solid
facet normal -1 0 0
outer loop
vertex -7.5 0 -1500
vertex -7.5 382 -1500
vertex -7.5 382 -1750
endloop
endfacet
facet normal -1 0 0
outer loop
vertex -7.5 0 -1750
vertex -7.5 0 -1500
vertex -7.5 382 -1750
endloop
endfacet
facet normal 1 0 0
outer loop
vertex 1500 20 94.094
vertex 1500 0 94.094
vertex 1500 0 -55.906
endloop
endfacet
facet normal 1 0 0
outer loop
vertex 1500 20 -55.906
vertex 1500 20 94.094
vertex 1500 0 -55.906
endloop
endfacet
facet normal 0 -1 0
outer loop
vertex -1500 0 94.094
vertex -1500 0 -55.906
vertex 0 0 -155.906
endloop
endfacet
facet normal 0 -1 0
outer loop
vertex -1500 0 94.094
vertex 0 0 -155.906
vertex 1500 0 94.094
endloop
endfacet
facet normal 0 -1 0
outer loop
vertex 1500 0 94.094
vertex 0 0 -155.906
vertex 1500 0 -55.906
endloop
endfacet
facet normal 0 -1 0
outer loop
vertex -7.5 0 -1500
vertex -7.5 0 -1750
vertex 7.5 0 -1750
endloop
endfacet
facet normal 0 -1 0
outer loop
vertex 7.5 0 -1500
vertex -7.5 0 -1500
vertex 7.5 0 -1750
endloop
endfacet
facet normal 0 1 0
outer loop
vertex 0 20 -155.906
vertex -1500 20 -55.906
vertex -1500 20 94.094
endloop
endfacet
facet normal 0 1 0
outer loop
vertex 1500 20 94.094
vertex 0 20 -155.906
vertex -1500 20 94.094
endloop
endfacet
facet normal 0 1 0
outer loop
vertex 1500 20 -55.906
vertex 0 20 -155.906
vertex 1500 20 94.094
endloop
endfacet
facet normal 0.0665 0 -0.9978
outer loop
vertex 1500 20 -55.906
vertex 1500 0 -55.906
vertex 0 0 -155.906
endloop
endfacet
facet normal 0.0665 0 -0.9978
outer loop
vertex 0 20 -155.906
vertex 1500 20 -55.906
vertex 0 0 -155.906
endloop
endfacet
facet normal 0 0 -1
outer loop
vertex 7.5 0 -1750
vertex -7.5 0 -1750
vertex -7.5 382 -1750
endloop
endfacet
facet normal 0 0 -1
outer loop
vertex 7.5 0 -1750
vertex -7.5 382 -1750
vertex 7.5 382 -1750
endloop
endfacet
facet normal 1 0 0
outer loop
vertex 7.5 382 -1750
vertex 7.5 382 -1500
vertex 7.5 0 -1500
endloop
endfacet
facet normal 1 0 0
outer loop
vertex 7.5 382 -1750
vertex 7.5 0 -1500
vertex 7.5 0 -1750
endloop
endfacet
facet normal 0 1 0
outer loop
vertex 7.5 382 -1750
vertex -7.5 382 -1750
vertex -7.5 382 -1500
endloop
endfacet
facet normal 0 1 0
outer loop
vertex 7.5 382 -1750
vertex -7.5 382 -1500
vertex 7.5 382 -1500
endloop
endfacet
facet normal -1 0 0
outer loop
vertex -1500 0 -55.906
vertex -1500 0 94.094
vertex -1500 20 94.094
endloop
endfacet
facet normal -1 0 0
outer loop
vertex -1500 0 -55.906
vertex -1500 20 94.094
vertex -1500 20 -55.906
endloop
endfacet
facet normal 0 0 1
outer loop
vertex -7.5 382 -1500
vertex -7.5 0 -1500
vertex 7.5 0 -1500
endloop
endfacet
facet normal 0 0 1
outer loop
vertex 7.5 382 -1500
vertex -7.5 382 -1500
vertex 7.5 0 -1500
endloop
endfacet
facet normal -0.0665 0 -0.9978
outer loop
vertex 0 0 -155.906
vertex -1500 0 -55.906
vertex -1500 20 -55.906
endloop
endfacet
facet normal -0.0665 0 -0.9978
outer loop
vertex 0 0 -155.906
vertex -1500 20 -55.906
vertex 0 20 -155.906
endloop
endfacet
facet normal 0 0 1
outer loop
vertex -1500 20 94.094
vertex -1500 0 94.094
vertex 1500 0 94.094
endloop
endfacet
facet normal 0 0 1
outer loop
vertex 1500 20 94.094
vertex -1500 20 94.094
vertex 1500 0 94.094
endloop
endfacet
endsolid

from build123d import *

# Parameters (mm, degrees)
BOSS_EXTRUDE3_DEPTH = 20
SKETCH3_W           = 15
SKETCH3_H           = 250
BOSS_EXTRUDE4_DEPTH = 382


with BuildPart() as part:
    # Sketch2 → Boss-Extrude3 (new body)
    with BuildSketch(Plane(origin=(0, 0, 0), x_dir=(1, 0, 0), z_dir=(0, 1, 0))):
        Polygon((0, -94.094043726), (-1500, -94.094043726), (-1500, 55.905956274), (0, 155.905956274), align=None)
    boss_extrude3 = extrude(amount=BOSS_EXTRUDE3_DEPTH)

    # Mirror1: Boss-Extrude3 across plane
    add(boss_extrude3.mirror(Plane(origin=(0, 20, 94.094043726), x_dir=(0, 0, 1), z_dir=(-1, 0, 0))))


with BuildPart() as body_2:
    # Sketch3 → Boss-Extrude4 (new body)
    with BuildSketch(Plane(origin=(0, 0, 0), x_dir=(1, 0, 0), z_dir=(0, 1, 0))):
        with Locations((0, 1625)):
            Rectangle(SKETCH3_W, SKETCH3_H)
    extrude(amount=BOSS_EXTRUDE4_DEPTH)


solid = Compound([part.part, body_2.part])
